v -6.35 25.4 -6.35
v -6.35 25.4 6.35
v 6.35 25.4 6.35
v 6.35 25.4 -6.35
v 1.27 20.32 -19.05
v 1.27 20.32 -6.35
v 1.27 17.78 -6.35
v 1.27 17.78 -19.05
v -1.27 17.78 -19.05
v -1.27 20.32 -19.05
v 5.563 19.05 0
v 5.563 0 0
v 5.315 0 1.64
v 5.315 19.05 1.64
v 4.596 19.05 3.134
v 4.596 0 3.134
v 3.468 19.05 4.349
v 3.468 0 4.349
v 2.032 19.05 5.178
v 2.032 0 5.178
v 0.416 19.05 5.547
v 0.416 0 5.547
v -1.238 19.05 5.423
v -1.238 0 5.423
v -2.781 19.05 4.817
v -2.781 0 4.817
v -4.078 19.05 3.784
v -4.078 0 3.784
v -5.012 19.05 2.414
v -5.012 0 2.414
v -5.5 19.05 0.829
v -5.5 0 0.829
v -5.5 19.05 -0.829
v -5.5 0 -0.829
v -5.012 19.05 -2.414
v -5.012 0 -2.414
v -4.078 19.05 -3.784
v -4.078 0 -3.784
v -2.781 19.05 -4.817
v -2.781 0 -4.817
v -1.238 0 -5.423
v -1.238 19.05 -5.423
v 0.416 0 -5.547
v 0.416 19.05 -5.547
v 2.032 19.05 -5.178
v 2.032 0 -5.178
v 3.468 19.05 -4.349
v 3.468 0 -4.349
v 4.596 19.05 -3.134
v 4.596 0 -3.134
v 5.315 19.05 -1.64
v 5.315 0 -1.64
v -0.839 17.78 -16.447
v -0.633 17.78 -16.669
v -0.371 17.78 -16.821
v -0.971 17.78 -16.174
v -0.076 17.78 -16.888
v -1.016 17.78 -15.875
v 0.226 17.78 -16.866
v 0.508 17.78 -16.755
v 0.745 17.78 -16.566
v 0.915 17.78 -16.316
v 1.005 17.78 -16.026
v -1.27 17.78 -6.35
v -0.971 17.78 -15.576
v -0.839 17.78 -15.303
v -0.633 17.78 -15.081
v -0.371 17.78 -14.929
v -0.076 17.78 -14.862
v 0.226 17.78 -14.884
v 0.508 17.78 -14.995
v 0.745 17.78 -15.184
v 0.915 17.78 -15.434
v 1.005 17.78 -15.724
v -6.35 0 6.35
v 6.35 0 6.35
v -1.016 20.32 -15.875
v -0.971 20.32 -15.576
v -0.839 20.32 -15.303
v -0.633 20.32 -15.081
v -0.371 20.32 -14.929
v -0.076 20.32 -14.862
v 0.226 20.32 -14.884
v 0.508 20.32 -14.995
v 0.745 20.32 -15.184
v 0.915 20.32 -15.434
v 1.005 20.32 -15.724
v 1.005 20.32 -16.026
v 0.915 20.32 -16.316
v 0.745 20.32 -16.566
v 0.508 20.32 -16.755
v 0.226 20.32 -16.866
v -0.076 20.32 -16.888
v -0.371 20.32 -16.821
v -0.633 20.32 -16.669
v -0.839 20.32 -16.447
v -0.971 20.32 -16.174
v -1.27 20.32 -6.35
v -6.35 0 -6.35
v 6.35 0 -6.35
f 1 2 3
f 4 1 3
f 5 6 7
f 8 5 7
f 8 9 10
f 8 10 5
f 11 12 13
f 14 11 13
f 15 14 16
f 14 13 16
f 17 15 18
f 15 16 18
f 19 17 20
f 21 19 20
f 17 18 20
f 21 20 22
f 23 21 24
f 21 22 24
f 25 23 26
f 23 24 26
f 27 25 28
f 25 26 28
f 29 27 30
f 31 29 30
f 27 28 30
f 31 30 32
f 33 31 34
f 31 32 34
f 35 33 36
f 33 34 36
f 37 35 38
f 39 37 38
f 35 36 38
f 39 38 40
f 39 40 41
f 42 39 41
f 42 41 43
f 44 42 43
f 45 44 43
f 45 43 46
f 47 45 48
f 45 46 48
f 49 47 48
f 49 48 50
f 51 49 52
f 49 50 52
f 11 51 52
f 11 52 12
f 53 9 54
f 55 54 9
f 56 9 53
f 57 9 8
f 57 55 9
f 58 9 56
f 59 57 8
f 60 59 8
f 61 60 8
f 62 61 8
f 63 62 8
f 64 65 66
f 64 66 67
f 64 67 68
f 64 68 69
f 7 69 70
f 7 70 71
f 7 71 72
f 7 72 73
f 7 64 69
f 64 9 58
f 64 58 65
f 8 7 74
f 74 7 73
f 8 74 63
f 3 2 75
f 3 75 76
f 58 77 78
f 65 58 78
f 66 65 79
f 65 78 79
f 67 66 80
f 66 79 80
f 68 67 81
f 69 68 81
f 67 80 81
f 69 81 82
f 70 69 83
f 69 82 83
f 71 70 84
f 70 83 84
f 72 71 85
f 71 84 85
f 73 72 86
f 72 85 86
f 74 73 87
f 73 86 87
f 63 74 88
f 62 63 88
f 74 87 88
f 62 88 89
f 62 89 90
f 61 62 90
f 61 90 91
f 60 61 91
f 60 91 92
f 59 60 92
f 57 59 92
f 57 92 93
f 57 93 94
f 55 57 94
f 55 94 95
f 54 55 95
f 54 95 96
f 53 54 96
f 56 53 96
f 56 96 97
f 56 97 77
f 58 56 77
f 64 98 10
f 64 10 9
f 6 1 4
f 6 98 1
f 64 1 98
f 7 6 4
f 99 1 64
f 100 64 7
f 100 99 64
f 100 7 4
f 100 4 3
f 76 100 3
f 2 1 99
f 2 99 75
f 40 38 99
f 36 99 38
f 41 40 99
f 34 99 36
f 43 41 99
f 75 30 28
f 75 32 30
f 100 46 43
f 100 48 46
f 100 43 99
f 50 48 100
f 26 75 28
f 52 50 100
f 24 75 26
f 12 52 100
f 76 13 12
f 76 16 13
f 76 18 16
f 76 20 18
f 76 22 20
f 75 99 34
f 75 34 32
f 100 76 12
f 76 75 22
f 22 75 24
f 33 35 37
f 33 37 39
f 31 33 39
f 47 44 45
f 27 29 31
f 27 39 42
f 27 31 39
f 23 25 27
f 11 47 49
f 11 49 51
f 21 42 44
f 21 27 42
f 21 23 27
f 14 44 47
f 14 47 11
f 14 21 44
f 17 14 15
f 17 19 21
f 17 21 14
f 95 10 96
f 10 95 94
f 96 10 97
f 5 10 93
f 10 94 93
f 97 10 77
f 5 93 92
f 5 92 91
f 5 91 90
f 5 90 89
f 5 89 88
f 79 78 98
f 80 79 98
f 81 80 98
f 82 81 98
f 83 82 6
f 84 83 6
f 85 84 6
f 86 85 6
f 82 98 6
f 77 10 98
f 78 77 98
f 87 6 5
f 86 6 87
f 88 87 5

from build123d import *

# Parameters (mm, degrees)
F0_W     = 12.7
F0_H     = 12.7
F1_DEPTH = 25.4
F2_R     = 5.5626
F3_DEPTH = 19.05
F4_W     = 2.54
F4_H     = 2.54
F5_DEPTH = 12.7
F6_R     = 1.016
F7_DEPTH = 25.4


with BuildPart() as f1:
    # F0 (on Front) → F1 (new body)
    with BuildSketch(Plane.XZ):
        Rectangle(F0_W, F0_H)
    extrude(amount=-F1_DEPTH)

    # F2 (on face) → F3 (cut)
    with BuildSketch(Plane.XZ):
        Circle(F2_R)
    extrude(amount=-F3_DEPTH, mode=Mode.SUBTRACT)

    # F4 (on face) → F5 (join)
    with BuildSketch(Plane(origin=(0, 0, -6.35), x_dir=(1, 0, 0), z_dir=(0, 0, -1))):
        with Locations((0, -19.05)):
            Rectangle(F4_W, F4_H)
    extrude(amount=F5_DEPTH)

    # F6 (on face) → F7 (cut)
    with BuildSketch(Plane(origin=(0, 20.32, 0), x_dir=(-1, 0, 0), z_dir=(0, 1, 0))):
        with Locations((0, -15.875)):
            Circle(F6_R)
    extrude(amount=-F7_DEPTH, mode=Mode.SUBTRACT)


solid = f1.part
